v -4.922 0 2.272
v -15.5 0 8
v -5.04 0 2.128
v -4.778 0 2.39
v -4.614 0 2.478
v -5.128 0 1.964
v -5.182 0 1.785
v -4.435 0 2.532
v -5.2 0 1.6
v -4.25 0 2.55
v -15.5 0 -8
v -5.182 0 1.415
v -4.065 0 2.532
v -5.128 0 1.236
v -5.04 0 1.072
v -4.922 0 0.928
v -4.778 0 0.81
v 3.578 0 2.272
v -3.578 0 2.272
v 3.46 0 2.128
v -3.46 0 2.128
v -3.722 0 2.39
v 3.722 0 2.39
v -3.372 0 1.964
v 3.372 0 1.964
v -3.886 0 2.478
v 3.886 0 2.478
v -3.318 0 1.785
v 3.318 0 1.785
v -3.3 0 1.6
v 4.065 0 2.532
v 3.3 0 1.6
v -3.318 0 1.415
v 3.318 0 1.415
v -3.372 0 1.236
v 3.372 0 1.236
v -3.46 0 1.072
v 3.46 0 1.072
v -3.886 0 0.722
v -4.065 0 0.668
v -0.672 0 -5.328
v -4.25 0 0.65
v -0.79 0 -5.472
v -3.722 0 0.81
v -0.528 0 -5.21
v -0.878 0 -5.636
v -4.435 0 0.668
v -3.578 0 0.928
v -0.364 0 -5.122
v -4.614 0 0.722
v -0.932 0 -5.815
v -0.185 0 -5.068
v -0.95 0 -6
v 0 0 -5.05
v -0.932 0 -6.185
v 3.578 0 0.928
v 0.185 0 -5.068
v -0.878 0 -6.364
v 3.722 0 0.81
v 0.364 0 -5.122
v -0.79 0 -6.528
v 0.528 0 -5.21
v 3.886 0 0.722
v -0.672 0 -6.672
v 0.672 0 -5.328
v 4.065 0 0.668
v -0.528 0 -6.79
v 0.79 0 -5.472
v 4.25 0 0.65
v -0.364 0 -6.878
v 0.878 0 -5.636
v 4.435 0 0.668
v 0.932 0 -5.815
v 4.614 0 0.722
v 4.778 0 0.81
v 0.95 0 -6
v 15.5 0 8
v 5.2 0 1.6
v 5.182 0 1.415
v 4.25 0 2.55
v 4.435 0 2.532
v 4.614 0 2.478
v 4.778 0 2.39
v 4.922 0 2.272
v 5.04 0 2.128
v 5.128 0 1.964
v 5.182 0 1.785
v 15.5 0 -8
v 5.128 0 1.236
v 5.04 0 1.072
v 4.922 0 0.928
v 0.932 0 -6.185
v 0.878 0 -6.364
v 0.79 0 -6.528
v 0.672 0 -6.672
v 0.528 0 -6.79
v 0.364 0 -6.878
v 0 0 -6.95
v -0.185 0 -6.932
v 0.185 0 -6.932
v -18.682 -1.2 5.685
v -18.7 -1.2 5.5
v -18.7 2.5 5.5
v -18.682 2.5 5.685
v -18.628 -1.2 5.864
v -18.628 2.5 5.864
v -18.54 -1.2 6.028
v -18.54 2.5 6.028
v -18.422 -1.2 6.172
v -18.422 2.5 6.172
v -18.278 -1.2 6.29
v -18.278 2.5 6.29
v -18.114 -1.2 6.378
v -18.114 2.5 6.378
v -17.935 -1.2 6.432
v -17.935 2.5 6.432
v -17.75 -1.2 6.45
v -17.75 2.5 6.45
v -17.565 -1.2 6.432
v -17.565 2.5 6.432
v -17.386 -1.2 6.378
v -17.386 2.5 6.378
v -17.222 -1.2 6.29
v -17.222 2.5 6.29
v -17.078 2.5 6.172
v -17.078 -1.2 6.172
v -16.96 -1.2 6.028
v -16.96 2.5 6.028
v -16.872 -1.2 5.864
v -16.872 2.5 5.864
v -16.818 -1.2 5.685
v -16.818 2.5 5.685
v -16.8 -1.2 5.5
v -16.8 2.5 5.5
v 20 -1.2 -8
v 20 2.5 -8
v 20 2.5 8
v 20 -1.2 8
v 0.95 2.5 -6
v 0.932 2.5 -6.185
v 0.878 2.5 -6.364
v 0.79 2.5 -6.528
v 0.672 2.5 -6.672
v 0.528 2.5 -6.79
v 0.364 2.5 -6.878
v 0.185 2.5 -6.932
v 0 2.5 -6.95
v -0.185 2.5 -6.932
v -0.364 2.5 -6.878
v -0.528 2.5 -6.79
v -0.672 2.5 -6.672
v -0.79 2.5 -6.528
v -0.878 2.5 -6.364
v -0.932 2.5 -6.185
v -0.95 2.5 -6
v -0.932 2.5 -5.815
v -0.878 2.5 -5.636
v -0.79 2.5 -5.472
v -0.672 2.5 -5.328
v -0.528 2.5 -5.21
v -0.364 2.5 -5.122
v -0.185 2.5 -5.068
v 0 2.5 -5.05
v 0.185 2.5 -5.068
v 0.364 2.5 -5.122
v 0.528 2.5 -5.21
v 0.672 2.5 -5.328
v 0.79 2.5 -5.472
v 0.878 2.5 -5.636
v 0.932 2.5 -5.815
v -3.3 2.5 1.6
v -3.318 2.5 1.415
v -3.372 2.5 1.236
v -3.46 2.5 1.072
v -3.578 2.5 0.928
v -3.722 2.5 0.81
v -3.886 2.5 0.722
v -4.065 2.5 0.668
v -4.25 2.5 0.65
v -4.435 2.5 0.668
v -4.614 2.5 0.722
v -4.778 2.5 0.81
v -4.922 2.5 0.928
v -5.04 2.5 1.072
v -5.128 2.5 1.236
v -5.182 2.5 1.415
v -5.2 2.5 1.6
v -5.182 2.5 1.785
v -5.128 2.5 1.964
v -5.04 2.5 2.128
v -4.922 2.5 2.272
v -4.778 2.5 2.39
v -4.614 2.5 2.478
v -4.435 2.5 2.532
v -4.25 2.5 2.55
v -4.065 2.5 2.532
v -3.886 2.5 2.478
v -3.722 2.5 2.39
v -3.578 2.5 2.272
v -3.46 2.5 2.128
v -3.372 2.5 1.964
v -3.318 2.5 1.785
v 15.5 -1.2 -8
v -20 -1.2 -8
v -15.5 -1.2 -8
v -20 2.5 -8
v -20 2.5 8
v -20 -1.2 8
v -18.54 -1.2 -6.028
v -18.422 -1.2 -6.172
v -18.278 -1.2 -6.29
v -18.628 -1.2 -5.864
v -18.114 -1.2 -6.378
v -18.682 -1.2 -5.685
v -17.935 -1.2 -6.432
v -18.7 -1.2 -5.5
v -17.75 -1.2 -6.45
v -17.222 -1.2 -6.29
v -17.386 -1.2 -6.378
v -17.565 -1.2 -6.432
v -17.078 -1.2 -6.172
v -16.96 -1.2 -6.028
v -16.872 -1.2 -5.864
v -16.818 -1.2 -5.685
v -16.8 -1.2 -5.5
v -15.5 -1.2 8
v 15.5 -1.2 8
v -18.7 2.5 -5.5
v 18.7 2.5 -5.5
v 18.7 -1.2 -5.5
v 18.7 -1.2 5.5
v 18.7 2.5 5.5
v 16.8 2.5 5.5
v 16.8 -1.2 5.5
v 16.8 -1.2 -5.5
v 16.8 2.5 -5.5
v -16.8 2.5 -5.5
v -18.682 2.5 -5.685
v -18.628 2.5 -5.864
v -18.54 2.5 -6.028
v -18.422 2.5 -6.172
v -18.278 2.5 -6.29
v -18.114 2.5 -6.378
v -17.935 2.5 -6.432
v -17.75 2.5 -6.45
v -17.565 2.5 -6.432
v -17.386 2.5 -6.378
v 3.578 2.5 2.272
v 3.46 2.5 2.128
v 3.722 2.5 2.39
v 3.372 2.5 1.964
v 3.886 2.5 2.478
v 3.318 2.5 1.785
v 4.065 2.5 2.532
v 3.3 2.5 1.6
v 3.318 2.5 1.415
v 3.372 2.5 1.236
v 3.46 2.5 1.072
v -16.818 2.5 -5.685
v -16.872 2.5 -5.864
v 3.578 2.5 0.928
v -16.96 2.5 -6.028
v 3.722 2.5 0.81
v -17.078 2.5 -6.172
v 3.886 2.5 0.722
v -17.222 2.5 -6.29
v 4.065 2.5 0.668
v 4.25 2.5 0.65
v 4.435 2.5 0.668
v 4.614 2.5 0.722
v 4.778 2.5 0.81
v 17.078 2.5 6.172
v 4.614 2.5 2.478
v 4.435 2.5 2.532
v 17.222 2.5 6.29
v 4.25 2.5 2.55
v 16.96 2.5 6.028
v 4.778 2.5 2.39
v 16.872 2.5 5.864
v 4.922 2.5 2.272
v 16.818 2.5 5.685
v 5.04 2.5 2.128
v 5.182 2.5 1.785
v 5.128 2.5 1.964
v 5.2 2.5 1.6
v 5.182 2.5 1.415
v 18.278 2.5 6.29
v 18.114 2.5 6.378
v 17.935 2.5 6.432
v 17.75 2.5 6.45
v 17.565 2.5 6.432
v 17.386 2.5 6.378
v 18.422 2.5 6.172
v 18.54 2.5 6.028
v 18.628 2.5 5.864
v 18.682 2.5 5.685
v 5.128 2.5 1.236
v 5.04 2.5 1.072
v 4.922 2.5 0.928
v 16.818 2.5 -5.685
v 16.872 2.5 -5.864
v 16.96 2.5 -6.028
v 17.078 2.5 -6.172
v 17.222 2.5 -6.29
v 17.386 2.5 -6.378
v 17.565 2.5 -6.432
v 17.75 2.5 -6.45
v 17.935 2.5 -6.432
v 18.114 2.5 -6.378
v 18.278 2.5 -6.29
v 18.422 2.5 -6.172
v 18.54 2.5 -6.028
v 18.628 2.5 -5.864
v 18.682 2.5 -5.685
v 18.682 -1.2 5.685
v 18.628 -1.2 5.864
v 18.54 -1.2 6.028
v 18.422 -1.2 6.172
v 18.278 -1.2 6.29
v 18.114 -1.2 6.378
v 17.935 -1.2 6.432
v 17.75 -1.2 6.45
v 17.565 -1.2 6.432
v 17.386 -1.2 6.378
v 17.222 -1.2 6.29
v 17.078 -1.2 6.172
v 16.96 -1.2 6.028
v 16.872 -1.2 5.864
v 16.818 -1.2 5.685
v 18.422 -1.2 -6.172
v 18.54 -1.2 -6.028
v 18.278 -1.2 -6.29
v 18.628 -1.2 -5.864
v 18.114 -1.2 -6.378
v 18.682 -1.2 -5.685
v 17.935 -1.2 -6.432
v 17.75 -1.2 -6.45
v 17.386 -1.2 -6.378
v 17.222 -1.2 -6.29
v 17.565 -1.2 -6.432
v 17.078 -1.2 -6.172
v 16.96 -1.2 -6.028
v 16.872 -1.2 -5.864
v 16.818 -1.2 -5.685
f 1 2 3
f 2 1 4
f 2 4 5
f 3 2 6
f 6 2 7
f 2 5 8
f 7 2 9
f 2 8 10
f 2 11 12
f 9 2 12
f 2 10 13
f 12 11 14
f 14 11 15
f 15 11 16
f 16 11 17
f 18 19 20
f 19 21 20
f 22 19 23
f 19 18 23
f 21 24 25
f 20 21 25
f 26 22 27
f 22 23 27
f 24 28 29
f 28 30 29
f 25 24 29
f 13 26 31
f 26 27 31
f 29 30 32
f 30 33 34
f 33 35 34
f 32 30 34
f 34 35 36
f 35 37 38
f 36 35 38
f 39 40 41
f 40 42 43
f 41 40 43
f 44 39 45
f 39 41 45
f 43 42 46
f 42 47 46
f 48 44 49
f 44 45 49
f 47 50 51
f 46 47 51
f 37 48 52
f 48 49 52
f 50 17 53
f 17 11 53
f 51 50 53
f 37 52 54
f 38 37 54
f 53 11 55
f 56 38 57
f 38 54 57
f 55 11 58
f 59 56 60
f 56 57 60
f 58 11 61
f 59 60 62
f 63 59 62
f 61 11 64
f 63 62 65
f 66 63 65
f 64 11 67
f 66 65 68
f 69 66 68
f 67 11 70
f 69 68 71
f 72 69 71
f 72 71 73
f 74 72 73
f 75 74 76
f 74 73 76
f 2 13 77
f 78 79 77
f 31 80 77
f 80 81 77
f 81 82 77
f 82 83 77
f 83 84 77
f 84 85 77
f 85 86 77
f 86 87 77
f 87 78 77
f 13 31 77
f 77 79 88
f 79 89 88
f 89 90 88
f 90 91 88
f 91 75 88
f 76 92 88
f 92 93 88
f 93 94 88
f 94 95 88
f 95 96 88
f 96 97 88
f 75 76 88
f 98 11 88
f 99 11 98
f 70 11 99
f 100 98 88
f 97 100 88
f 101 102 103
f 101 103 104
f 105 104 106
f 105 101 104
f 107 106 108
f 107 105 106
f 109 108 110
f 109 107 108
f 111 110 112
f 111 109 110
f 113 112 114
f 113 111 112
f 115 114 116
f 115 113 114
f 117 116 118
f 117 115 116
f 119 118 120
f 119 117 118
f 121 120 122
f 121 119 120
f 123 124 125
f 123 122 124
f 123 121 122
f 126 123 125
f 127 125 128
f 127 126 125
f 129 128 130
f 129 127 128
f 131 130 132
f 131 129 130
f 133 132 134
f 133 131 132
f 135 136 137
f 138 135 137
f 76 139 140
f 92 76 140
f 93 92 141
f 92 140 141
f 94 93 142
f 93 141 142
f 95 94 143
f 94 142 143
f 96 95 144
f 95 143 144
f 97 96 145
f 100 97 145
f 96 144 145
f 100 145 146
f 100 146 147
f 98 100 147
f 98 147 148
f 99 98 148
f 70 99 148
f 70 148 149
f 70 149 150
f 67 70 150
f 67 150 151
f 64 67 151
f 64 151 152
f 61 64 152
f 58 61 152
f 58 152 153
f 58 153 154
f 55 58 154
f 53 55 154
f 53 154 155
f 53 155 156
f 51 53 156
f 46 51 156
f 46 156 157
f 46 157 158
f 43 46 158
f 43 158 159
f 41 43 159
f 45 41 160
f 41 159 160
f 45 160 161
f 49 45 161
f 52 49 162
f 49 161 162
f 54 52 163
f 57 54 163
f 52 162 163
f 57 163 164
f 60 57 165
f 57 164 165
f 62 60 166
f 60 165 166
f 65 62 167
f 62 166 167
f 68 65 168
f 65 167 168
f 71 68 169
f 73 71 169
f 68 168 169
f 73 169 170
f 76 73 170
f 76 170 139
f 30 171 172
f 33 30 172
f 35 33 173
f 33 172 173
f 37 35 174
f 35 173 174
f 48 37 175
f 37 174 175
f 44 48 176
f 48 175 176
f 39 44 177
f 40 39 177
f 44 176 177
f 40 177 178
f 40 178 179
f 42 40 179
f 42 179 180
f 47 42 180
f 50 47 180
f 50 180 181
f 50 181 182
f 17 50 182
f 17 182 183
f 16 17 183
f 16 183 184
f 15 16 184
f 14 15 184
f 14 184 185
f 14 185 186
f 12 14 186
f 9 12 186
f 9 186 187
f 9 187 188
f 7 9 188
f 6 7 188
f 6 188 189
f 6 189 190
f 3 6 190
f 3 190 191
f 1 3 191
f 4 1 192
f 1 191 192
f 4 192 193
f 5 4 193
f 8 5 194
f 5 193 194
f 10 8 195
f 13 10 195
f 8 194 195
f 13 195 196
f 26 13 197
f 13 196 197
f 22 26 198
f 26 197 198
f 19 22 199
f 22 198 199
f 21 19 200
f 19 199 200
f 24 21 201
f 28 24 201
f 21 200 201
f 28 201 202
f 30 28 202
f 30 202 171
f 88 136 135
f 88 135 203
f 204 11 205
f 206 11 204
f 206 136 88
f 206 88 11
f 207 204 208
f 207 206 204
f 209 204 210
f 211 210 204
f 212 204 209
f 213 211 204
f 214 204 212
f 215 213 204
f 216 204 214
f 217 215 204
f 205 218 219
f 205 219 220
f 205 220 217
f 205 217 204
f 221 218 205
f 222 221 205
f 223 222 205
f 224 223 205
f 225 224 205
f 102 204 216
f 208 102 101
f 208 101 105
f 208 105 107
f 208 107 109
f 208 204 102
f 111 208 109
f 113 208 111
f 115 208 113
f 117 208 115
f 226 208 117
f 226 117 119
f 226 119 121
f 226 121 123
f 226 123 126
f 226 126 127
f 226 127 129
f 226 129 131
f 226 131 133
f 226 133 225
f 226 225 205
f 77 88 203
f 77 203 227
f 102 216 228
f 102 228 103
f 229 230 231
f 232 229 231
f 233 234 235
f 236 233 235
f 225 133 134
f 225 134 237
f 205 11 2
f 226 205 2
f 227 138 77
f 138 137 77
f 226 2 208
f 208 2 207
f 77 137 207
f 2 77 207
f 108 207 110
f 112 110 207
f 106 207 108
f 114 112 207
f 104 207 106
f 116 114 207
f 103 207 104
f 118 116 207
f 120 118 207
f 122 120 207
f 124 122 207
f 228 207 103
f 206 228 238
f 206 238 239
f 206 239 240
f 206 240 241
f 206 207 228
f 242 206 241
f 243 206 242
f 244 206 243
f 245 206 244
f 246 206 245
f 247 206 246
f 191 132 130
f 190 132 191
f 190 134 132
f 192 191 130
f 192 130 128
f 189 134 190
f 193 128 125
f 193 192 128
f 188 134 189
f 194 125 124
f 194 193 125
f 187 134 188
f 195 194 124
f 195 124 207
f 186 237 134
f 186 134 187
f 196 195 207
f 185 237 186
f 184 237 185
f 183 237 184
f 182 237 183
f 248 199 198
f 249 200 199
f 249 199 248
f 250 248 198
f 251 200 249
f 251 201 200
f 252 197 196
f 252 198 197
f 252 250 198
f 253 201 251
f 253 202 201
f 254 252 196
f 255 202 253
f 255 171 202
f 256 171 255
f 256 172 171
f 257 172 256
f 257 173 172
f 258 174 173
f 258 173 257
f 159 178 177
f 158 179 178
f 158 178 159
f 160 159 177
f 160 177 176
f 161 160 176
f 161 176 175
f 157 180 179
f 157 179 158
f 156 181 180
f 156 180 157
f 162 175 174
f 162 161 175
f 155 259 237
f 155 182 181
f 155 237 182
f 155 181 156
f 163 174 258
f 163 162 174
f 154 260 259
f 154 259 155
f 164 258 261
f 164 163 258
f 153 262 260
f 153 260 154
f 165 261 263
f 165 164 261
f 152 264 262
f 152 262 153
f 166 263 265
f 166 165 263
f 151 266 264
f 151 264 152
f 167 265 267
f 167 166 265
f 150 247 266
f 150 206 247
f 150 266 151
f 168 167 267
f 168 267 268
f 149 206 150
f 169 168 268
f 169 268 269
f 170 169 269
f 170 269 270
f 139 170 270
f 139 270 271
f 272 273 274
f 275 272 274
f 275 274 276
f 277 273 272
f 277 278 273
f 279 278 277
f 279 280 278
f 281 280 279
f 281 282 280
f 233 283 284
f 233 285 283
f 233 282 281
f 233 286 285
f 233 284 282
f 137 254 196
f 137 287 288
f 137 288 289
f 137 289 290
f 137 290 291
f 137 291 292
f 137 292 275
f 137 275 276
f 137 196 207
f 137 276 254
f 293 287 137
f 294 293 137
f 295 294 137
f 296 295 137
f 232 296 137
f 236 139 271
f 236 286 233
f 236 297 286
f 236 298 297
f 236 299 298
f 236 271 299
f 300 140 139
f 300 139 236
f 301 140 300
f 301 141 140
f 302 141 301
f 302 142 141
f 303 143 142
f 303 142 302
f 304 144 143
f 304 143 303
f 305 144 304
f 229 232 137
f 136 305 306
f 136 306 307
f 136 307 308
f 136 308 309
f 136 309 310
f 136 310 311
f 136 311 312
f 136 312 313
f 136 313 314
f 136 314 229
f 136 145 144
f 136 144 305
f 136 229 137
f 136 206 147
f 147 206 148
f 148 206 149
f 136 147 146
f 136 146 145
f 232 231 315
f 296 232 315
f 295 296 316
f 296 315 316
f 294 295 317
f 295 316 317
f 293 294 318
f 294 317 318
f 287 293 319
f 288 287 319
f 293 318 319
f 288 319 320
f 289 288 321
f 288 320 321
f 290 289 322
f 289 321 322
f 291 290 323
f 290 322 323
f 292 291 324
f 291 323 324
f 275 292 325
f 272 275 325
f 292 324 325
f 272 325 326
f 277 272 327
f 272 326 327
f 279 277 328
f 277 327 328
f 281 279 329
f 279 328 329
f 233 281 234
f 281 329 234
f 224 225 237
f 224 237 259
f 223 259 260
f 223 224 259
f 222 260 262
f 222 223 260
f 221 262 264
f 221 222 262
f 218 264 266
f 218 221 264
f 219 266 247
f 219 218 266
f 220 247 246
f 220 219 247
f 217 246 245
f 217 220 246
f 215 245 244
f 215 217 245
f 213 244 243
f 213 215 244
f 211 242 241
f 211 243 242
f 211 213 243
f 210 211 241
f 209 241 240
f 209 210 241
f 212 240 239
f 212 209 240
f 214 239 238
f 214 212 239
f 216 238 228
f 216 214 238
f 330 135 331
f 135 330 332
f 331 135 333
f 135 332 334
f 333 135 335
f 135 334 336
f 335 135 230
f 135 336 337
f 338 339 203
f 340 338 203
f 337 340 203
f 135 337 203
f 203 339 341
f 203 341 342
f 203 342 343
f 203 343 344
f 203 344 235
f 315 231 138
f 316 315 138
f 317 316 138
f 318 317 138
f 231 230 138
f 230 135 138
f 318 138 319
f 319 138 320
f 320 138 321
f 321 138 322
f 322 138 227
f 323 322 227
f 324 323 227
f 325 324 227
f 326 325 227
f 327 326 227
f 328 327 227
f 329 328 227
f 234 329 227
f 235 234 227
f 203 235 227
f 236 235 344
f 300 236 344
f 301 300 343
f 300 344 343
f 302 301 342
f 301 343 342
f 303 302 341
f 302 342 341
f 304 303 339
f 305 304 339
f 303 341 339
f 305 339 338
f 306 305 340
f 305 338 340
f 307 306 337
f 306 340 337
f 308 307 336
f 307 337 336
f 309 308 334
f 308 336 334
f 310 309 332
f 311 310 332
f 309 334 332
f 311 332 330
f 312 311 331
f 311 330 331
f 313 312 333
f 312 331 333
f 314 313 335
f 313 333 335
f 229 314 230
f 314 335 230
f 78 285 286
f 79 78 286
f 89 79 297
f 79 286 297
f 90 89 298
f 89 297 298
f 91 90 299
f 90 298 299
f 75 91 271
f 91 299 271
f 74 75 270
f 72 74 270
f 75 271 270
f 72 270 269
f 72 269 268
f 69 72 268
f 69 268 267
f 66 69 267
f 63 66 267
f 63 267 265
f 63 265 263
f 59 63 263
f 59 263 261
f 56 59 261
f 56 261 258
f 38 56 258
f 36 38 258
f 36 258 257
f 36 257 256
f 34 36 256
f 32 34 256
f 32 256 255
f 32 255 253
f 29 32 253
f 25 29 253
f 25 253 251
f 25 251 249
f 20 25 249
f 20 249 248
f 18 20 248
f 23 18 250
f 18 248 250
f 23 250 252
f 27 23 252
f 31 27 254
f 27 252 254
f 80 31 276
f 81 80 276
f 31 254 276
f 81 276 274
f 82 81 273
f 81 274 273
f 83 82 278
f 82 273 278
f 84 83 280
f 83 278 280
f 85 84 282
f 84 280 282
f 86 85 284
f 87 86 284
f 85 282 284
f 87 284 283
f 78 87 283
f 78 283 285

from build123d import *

# Parameters (mm, degrees)
SKETCH1_W           = 40
SKETCH1_H           = 16
BOSS_EXTRUDE1_DEPTH = 2.5
SKETCH2_W           = 4.5
SKETCH2_H           = 16
BOSS_EXTRUDE2_DEPTH = 1.2
CUT_EXTRUDE1_DEPTH  = 4.7
SKETCH4_R           = 0.95
CUT_EXTRUDE2_DEPTH  = 4.7


with BuildPart() as part:
    # Sketch1 → Boss-Extrude1 (new body)
    with BuildSketch(Plane(origin=(0, 0, 0), x_dir=(1, 0, 0), z_dir=(0, 1, 0))):
        Rectangle(SKETCH1_W, SKETCH1_H)
    extrude(amount=BOSS_EXTRUDE1_DEPTH)

    # Sketch2 → Boss-Extrude2 (add)
    with BuildSketch(Plane.XZ):
        with Locations((-17.75, 0)):
            Rectangle(SKETCH2_W, SKETCH2_H)
    boss_extrude2 = extrude(amount=BOSS_EXTRUDE2_DEPTH)

    # Sketch3 → Cut-Extrude1 (cut, through all)
    with BuildSketch(Plane.XZ.offset(1.2)):
        with BuildLine():
            Line((-16.8, 5.5), (-16.8, -5.5))
            ThreePointArc((-16.8, -5.5), (-17.75, -6.45), (-18.7, -5.5))
            Line((-18.7, -5.5), (-18.7, 5.5))
            ThreePointArc((-18.7, 5.5), (-17.75, 6.45), (-16.8, 5.5))
        make_face()
    cut_extrude1 = extrude(amount=-CUT_EXTRUDE1_DEPTH, mode=Mode.SUBTRACT)

    # Mirror1: Boss-Extrude2, Cut-Extrude1 across plane
    add(boss_extrude2.mirror(Plane(origin=(0, 0, 0), x_dir=(0, 0, 1), z_dir=(1, 0, 0))))
    add(cut_extrude1.mirror(Plane(origin=(0, 0, 0), x_dir=(0, 0, 1), z_dir=(1, 0, 0))), mode=Mode.SUBTRACT)

    # Sketch4 → Cut-Extrude2 (cut, through all)
    with BuildSketch(Plane(origin=(0, 2.5, 0), x_dir=(1, 0, 0), z_dir=(0, 1, 0))):
        with Locations((4.25, -1.6)):
            Circle(SKETCH4_R)
        with Locations((-4.25, -1.6)):
            Circle(SKETCH4_R)
        with Locations((0, 6)):
            Circle(SKETCH4_R)
    extrude(amount=-CUT_EXTRUDE2_DEPTH, mode=Mode.SUBTRACT)


solid = part.part
